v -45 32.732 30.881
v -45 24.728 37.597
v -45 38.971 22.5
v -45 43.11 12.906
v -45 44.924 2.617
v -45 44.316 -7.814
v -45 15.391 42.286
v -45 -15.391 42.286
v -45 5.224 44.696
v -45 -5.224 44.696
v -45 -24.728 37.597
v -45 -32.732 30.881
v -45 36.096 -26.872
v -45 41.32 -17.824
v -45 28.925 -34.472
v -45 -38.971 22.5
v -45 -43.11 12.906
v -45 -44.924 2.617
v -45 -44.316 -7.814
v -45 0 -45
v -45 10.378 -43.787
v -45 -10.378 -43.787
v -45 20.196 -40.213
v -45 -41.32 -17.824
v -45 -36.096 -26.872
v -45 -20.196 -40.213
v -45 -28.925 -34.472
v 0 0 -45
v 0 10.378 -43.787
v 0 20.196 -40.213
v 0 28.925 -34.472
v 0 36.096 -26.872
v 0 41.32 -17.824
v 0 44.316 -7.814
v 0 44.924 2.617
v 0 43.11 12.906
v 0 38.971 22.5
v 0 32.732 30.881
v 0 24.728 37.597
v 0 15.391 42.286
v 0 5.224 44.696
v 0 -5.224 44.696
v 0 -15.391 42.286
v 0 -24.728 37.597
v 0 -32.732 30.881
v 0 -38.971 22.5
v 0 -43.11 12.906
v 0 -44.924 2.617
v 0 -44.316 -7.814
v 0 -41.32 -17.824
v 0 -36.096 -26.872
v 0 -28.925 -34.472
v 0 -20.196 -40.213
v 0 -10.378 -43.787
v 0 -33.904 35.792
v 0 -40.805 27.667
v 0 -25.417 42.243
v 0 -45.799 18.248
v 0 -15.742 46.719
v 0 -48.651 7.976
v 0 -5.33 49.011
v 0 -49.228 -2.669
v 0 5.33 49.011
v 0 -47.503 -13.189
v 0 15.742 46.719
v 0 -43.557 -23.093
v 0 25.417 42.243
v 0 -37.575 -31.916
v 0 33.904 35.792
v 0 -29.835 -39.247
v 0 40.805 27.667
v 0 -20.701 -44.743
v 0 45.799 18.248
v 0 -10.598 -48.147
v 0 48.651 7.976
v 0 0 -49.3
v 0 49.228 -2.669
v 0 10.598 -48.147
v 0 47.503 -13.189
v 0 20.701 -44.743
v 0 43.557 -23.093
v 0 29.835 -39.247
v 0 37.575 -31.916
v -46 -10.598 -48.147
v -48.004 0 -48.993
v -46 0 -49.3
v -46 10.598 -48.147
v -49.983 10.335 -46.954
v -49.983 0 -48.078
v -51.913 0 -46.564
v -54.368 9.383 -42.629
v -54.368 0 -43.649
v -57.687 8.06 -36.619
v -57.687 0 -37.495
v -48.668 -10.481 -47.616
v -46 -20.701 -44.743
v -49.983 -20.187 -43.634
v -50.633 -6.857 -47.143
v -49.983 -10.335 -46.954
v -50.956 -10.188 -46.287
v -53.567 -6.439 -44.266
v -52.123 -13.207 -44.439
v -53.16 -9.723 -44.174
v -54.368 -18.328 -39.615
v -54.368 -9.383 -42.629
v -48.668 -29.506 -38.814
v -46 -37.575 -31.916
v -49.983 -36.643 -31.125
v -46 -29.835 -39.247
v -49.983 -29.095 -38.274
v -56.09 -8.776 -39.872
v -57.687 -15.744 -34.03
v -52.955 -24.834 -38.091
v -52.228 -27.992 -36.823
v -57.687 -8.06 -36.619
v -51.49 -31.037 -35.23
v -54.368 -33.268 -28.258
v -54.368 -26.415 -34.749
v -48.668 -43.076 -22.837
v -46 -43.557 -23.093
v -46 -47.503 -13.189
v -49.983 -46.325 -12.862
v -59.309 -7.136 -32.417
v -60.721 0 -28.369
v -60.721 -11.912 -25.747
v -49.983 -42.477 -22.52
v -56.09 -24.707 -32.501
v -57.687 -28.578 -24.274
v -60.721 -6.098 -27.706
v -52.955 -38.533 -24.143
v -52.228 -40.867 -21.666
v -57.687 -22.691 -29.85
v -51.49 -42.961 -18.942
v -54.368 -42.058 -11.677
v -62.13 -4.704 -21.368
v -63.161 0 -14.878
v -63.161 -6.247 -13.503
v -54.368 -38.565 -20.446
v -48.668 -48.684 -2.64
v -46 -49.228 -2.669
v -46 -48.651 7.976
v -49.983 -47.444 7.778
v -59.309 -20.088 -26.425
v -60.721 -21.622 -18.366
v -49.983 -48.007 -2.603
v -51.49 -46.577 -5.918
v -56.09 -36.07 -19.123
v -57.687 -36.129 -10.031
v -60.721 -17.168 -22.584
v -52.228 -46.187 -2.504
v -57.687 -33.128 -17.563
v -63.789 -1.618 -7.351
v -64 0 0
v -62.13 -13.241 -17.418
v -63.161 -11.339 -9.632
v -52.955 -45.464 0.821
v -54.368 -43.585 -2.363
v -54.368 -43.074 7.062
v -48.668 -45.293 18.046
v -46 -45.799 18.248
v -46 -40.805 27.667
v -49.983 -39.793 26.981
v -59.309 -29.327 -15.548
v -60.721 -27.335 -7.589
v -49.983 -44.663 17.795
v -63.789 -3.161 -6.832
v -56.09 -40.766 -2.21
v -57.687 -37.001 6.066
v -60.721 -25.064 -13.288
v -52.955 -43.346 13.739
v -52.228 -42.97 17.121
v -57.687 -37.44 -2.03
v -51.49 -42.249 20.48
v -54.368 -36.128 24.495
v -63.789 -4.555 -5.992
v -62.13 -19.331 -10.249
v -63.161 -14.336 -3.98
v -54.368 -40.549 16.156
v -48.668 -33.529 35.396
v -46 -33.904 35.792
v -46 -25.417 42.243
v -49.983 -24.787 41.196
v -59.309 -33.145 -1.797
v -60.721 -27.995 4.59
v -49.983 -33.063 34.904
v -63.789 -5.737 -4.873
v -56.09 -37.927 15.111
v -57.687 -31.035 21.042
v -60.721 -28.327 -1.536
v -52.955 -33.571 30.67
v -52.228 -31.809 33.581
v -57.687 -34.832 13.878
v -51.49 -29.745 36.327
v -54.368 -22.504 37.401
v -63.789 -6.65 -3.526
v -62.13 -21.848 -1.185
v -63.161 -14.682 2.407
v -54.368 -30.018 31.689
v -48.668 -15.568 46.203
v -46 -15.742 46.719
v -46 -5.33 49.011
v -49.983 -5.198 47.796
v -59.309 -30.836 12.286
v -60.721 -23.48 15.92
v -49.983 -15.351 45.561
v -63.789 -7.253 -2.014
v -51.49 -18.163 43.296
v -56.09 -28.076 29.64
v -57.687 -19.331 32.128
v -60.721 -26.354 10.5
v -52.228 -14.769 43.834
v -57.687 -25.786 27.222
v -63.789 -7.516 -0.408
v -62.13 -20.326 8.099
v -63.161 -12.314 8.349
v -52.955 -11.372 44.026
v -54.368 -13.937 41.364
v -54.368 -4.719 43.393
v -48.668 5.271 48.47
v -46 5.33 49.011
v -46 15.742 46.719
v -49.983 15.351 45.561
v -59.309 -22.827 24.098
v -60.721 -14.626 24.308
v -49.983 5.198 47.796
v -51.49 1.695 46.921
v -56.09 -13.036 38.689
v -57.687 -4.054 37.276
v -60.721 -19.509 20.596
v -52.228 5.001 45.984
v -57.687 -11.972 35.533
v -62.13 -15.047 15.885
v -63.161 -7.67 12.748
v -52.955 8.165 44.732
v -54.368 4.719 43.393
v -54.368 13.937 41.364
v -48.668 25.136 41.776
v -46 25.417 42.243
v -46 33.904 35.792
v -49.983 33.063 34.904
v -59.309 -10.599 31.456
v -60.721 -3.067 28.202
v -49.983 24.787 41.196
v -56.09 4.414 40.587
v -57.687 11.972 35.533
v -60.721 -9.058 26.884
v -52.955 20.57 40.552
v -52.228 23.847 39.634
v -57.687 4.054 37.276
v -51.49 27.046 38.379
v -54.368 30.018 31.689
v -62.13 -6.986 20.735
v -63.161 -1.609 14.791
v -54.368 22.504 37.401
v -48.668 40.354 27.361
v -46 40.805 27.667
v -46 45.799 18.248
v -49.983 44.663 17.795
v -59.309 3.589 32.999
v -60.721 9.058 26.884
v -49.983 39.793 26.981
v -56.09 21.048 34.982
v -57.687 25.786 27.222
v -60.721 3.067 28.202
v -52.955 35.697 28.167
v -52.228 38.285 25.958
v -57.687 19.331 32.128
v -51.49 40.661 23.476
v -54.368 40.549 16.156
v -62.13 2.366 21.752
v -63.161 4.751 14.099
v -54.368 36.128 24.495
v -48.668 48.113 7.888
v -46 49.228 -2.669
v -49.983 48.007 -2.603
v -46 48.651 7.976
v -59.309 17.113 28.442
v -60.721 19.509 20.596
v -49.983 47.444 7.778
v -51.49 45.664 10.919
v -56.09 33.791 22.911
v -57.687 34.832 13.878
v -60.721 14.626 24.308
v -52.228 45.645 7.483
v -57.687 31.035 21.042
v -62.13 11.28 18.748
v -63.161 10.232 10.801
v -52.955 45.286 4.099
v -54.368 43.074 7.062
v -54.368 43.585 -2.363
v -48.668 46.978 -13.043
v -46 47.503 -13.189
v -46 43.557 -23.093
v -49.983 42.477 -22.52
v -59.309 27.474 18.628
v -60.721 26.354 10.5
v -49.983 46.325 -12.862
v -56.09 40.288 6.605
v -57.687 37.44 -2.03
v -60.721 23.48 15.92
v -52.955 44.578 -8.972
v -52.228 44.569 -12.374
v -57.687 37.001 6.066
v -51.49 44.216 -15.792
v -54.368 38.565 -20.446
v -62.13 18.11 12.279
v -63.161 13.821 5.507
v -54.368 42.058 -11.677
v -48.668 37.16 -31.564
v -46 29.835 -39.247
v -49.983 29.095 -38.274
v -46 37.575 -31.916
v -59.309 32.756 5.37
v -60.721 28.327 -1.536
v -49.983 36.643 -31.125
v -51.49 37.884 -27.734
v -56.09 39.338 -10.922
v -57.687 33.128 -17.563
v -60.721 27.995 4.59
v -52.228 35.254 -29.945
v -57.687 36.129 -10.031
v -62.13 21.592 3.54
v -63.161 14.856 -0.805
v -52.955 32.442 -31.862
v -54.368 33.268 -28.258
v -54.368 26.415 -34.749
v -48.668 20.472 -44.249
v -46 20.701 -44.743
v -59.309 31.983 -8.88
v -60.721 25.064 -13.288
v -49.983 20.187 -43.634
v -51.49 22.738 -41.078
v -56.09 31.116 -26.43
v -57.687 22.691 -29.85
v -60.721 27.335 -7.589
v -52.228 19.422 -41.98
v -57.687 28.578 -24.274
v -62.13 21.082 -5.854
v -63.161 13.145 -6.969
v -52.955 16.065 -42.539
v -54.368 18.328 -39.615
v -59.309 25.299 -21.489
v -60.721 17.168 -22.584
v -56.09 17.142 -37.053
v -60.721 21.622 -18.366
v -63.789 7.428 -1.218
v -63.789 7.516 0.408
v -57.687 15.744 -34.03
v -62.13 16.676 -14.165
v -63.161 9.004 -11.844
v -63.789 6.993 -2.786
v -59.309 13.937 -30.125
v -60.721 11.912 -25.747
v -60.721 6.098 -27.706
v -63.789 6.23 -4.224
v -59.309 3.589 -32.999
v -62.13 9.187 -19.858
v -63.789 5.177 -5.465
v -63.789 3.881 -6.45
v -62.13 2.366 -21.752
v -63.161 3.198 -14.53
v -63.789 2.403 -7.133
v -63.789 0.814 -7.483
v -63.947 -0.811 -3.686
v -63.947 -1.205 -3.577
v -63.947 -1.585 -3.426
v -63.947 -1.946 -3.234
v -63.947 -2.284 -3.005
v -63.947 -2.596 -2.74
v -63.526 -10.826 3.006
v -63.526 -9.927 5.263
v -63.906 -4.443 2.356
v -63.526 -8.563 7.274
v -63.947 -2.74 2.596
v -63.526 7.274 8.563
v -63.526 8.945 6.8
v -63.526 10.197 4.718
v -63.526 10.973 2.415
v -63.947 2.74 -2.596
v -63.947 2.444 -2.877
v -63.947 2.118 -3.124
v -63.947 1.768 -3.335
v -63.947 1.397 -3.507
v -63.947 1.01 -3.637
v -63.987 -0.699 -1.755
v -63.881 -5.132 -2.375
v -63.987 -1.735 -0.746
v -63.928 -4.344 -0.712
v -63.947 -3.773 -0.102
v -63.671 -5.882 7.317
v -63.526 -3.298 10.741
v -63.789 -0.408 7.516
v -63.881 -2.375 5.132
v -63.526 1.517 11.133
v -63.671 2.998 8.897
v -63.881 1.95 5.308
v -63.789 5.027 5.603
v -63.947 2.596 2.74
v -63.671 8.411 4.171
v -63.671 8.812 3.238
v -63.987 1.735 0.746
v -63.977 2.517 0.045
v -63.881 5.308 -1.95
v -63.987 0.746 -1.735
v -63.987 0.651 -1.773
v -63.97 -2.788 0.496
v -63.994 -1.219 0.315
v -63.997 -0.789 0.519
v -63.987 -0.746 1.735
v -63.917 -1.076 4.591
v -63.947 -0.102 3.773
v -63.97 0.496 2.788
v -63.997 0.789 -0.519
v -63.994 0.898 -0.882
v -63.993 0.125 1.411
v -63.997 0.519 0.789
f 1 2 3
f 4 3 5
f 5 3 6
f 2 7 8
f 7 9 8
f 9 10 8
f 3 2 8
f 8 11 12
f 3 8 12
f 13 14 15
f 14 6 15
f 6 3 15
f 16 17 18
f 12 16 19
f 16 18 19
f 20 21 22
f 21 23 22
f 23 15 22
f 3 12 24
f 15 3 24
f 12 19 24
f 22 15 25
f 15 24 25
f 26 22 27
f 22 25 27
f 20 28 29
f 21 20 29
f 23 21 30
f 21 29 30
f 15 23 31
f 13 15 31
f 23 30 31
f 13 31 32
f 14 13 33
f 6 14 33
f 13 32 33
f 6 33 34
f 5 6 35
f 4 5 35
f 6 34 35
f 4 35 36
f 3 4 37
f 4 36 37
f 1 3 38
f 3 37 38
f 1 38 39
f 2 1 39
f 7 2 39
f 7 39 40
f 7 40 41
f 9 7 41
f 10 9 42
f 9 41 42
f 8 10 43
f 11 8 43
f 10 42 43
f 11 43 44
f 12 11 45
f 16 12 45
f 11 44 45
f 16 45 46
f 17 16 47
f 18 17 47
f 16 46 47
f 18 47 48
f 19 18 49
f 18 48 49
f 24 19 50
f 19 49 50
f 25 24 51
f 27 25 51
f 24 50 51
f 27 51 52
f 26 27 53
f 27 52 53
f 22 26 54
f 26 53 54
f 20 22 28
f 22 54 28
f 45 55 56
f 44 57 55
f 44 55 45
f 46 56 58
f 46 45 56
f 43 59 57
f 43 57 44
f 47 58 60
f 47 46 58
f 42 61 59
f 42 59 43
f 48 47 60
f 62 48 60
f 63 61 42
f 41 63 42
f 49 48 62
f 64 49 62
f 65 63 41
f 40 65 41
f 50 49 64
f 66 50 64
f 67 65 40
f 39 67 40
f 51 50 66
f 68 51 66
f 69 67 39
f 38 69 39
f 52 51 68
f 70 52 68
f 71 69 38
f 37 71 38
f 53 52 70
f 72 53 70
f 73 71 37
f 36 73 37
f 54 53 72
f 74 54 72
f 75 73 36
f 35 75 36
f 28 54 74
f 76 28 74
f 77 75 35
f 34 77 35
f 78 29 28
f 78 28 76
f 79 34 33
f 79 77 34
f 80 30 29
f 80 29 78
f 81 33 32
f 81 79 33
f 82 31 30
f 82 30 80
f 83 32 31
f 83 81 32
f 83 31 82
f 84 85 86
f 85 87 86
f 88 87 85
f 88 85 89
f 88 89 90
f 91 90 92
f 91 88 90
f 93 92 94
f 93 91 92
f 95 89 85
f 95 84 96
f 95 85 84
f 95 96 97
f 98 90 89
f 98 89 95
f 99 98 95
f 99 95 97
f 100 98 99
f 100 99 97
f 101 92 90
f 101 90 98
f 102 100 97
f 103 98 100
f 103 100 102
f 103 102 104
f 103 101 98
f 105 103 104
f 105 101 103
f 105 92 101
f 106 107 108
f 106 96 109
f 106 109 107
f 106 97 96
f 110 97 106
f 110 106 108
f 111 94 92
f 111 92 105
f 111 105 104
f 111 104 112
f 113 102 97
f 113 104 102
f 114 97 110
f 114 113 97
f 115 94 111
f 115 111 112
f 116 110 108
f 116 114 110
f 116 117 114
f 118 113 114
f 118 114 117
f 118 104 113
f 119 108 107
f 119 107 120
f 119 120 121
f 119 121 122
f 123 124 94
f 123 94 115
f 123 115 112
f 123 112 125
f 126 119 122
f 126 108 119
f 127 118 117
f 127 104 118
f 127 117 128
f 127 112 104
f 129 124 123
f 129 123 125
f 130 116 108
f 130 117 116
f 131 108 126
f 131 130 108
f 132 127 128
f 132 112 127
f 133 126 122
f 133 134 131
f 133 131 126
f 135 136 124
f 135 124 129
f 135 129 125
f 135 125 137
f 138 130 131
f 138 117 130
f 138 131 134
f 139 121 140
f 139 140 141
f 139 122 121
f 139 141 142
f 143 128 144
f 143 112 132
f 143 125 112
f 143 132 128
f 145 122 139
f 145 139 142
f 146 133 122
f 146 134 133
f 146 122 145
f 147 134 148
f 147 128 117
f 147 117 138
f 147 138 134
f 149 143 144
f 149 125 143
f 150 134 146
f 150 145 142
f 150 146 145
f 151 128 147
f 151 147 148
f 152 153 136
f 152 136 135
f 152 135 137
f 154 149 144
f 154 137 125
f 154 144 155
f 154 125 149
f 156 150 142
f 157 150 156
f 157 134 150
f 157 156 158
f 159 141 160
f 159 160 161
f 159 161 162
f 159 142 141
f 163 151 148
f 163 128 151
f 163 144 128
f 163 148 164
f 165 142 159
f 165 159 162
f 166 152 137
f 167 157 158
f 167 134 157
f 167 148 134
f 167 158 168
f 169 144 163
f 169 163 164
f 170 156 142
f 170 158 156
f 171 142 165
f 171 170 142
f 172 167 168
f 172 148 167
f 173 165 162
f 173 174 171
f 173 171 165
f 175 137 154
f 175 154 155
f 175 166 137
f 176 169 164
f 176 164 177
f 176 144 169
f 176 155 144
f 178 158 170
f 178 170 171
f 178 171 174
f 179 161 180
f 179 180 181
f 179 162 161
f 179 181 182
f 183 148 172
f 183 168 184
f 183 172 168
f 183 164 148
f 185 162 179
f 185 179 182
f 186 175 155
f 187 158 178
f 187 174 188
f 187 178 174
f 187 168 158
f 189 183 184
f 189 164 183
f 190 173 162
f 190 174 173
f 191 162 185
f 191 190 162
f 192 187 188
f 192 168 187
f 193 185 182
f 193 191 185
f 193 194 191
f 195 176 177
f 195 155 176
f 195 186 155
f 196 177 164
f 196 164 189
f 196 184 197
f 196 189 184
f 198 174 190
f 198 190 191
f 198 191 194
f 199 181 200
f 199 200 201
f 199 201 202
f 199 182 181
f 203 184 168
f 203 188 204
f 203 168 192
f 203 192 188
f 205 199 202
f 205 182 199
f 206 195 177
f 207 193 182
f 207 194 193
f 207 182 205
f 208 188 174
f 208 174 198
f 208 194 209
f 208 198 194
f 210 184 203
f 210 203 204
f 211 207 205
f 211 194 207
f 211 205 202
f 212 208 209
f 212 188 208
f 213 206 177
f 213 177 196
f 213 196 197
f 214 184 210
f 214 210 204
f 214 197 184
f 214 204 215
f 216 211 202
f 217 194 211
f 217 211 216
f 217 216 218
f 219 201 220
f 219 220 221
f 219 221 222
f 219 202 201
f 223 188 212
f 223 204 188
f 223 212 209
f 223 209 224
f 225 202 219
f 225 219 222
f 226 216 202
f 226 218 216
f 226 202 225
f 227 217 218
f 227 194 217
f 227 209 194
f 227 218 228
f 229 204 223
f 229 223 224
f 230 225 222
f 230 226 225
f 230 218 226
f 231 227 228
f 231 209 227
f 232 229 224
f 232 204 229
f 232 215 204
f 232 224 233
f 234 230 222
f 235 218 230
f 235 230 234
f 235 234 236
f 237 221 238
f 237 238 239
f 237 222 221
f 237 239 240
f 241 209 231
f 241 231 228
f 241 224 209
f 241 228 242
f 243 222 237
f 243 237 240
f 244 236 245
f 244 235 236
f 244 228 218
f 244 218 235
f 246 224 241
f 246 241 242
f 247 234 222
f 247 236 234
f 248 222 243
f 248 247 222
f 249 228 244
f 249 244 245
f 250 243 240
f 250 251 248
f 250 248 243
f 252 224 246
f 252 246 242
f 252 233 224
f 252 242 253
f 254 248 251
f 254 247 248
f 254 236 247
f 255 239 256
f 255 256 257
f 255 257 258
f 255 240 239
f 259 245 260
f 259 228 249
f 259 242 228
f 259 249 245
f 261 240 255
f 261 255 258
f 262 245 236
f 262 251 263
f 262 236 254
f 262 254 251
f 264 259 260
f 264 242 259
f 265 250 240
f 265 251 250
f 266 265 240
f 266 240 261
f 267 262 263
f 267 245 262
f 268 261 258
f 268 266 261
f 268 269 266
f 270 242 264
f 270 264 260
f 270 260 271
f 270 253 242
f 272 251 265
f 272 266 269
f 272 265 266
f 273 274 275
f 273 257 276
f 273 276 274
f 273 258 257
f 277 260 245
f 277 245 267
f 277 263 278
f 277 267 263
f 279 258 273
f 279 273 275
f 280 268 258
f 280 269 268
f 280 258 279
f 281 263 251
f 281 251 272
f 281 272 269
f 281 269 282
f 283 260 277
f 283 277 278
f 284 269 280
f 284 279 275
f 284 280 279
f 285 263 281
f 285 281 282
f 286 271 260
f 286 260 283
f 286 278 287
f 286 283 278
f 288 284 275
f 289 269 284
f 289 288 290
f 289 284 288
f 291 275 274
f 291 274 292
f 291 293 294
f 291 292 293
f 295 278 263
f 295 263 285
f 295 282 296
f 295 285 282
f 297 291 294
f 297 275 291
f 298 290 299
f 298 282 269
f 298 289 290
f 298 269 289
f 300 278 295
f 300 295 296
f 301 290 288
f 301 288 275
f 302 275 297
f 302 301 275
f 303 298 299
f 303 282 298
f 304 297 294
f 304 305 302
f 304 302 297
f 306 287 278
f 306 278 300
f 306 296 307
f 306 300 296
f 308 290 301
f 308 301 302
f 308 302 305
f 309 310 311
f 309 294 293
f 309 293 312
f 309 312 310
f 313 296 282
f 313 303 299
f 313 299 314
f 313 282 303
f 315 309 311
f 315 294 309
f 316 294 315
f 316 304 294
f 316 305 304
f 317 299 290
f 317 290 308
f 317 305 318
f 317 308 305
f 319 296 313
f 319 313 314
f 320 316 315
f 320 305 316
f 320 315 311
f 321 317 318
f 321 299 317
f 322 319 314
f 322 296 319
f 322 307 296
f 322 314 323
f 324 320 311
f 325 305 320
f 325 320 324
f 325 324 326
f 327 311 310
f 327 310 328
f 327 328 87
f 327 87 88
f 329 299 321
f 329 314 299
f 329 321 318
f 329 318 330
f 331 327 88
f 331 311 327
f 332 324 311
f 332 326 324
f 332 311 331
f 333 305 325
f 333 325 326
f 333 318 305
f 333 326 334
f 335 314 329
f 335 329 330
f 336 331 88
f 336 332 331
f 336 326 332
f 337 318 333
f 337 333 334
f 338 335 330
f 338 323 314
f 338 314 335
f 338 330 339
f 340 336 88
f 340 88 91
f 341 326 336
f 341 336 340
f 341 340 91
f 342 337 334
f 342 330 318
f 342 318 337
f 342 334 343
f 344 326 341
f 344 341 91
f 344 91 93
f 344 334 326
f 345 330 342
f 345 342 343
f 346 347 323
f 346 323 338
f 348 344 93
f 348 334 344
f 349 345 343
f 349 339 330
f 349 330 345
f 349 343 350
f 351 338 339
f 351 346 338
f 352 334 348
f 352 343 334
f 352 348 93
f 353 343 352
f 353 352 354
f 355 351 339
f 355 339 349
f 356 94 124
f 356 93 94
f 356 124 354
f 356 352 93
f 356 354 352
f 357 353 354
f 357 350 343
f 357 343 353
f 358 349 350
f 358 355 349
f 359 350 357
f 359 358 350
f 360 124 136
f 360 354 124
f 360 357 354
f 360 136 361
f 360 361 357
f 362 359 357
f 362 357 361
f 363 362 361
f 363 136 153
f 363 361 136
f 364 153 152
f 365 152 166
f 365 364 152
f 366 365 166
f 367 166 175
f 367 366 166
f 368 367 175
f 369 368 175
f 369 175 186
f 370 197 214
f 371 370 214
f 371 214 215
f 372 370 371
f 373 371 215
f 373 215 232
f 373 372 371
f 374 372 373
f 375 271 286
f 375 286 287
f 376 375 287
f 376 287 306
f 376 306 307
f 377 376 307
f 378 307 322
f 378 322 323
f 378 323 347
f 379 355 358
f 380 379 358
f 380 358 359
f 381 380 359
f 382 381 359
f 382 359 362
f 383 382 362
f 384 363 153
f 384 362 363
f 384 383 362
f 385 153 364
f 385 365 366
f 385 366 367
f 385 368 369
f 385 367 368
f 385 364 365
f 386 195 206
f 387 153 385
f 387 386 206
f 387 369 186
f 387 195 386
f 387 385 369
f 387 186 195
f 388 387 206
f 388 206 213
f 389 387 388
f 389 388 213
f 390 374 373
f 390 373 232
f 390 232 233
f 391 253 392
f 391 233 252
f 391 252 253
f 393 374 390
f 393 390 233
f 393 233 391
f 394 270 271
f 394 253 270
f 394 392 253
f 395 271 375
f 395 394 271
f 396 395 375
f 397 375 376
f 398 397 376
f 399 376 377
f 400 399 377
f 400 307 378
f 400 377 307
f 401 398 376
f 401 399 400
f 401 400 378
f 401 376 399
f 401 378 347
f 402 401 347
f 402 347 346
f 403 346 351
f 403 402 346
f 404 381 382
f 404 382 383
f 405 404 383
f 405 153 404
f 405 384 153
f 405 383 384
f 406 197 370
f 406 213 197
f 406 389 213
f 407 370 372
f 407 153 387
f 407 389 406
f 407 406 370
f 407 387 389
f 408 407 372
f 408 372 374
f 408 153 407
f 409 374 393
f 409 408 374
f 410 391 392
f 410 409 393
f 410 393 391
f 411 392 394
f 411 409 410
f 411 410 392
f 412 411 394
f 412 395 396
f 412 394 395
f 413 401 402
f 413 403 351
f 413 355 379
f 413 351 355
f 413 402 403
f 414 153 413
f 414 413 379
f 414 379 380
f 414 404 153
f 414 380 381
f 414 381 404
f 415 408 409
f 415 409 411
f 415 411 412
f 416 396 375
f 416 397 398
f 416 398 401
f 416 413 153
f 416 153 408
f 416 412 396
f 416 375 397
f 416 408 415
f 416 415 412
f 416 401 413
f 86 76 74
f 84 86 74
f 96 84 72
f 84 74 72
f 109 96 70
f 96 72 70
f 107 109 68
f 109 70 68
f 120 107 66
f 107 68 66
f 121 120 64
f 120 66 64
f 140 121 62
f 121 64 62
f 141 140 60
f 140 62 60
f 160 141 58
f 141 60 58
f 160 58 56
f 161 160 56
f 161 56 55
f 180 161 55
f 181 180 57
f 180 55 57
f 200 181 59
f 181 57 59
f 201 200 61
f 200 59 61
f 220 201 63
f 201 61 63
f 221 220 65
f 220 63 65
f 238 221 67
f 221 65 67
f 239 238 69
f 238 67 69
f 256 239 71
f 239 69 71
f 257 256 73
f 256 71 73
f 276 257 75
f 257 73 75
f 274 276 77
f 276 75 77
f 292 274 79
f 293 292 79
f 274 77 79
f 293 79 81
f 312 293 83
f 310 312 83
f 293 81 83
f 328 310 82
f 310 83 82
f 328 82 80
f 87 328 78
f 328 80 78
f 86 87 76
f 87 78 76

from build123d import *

# Parameters (mm, degrees)
SKETCH_1_R         = 49.3
SKETCH_1_R_2       = 45
EXTRUDE_1_DEPTH    = 45
SKETCH_2_R         = 49.3
EXTRUDE_1_2_DEPTH  = 1
DOME_1_FACE_RADIUS = 49.3
DOME_1_HEIGHT      = 18


with BuildPart() as part:
    # Эскиз1 → Extrude 1 (new body)
    with BuildSketch(Plane(origin=(0, 0, 0), x_dir=(0, 0, -1), z_dir=(1, 0, 0))):
        Circle(SKETCH_1_R)
        Circle(SKETCH_1_R_2, mode=Mode.SUBTRACT)
    extrude(amount=-EXTRUDE_1_DEPTH)

    # Эскиз2 → Extrude 1 2 (add)
    with BuildSketch(Plane.ZY.offset(45)):
        Circle(SKETCH_2_R)
    extrude(amount=EXTRUDE_1_2_DEPTH)

    # Купол1: an elliptical dome of height H over a round flat face of radius A is half a spheroid: the quarter ellipse of half axes A and H revolved about the face's axis
    with BuildSketch(Plane((-46, 0, 0), x_dir=(0, 0, -1), z_dir=(0, 1, 0)), mode=Mode.PRIVATE) as dome_1_quarter:
        Ellipse(DOME_1_FACE_RADIUS, DOME_1_HEIGHT)
        Rectangle(DOME_1_FACE_RADIUS, DOME_1_HEIGHT, align=(Align.MIN, Align.MIN), mode=Mode.INTERSECT)
    revolve(dome_1_quarter.sketch, axis=Axis((-46, 0, 0), (-1, 0, 0)))


solid = part.part
